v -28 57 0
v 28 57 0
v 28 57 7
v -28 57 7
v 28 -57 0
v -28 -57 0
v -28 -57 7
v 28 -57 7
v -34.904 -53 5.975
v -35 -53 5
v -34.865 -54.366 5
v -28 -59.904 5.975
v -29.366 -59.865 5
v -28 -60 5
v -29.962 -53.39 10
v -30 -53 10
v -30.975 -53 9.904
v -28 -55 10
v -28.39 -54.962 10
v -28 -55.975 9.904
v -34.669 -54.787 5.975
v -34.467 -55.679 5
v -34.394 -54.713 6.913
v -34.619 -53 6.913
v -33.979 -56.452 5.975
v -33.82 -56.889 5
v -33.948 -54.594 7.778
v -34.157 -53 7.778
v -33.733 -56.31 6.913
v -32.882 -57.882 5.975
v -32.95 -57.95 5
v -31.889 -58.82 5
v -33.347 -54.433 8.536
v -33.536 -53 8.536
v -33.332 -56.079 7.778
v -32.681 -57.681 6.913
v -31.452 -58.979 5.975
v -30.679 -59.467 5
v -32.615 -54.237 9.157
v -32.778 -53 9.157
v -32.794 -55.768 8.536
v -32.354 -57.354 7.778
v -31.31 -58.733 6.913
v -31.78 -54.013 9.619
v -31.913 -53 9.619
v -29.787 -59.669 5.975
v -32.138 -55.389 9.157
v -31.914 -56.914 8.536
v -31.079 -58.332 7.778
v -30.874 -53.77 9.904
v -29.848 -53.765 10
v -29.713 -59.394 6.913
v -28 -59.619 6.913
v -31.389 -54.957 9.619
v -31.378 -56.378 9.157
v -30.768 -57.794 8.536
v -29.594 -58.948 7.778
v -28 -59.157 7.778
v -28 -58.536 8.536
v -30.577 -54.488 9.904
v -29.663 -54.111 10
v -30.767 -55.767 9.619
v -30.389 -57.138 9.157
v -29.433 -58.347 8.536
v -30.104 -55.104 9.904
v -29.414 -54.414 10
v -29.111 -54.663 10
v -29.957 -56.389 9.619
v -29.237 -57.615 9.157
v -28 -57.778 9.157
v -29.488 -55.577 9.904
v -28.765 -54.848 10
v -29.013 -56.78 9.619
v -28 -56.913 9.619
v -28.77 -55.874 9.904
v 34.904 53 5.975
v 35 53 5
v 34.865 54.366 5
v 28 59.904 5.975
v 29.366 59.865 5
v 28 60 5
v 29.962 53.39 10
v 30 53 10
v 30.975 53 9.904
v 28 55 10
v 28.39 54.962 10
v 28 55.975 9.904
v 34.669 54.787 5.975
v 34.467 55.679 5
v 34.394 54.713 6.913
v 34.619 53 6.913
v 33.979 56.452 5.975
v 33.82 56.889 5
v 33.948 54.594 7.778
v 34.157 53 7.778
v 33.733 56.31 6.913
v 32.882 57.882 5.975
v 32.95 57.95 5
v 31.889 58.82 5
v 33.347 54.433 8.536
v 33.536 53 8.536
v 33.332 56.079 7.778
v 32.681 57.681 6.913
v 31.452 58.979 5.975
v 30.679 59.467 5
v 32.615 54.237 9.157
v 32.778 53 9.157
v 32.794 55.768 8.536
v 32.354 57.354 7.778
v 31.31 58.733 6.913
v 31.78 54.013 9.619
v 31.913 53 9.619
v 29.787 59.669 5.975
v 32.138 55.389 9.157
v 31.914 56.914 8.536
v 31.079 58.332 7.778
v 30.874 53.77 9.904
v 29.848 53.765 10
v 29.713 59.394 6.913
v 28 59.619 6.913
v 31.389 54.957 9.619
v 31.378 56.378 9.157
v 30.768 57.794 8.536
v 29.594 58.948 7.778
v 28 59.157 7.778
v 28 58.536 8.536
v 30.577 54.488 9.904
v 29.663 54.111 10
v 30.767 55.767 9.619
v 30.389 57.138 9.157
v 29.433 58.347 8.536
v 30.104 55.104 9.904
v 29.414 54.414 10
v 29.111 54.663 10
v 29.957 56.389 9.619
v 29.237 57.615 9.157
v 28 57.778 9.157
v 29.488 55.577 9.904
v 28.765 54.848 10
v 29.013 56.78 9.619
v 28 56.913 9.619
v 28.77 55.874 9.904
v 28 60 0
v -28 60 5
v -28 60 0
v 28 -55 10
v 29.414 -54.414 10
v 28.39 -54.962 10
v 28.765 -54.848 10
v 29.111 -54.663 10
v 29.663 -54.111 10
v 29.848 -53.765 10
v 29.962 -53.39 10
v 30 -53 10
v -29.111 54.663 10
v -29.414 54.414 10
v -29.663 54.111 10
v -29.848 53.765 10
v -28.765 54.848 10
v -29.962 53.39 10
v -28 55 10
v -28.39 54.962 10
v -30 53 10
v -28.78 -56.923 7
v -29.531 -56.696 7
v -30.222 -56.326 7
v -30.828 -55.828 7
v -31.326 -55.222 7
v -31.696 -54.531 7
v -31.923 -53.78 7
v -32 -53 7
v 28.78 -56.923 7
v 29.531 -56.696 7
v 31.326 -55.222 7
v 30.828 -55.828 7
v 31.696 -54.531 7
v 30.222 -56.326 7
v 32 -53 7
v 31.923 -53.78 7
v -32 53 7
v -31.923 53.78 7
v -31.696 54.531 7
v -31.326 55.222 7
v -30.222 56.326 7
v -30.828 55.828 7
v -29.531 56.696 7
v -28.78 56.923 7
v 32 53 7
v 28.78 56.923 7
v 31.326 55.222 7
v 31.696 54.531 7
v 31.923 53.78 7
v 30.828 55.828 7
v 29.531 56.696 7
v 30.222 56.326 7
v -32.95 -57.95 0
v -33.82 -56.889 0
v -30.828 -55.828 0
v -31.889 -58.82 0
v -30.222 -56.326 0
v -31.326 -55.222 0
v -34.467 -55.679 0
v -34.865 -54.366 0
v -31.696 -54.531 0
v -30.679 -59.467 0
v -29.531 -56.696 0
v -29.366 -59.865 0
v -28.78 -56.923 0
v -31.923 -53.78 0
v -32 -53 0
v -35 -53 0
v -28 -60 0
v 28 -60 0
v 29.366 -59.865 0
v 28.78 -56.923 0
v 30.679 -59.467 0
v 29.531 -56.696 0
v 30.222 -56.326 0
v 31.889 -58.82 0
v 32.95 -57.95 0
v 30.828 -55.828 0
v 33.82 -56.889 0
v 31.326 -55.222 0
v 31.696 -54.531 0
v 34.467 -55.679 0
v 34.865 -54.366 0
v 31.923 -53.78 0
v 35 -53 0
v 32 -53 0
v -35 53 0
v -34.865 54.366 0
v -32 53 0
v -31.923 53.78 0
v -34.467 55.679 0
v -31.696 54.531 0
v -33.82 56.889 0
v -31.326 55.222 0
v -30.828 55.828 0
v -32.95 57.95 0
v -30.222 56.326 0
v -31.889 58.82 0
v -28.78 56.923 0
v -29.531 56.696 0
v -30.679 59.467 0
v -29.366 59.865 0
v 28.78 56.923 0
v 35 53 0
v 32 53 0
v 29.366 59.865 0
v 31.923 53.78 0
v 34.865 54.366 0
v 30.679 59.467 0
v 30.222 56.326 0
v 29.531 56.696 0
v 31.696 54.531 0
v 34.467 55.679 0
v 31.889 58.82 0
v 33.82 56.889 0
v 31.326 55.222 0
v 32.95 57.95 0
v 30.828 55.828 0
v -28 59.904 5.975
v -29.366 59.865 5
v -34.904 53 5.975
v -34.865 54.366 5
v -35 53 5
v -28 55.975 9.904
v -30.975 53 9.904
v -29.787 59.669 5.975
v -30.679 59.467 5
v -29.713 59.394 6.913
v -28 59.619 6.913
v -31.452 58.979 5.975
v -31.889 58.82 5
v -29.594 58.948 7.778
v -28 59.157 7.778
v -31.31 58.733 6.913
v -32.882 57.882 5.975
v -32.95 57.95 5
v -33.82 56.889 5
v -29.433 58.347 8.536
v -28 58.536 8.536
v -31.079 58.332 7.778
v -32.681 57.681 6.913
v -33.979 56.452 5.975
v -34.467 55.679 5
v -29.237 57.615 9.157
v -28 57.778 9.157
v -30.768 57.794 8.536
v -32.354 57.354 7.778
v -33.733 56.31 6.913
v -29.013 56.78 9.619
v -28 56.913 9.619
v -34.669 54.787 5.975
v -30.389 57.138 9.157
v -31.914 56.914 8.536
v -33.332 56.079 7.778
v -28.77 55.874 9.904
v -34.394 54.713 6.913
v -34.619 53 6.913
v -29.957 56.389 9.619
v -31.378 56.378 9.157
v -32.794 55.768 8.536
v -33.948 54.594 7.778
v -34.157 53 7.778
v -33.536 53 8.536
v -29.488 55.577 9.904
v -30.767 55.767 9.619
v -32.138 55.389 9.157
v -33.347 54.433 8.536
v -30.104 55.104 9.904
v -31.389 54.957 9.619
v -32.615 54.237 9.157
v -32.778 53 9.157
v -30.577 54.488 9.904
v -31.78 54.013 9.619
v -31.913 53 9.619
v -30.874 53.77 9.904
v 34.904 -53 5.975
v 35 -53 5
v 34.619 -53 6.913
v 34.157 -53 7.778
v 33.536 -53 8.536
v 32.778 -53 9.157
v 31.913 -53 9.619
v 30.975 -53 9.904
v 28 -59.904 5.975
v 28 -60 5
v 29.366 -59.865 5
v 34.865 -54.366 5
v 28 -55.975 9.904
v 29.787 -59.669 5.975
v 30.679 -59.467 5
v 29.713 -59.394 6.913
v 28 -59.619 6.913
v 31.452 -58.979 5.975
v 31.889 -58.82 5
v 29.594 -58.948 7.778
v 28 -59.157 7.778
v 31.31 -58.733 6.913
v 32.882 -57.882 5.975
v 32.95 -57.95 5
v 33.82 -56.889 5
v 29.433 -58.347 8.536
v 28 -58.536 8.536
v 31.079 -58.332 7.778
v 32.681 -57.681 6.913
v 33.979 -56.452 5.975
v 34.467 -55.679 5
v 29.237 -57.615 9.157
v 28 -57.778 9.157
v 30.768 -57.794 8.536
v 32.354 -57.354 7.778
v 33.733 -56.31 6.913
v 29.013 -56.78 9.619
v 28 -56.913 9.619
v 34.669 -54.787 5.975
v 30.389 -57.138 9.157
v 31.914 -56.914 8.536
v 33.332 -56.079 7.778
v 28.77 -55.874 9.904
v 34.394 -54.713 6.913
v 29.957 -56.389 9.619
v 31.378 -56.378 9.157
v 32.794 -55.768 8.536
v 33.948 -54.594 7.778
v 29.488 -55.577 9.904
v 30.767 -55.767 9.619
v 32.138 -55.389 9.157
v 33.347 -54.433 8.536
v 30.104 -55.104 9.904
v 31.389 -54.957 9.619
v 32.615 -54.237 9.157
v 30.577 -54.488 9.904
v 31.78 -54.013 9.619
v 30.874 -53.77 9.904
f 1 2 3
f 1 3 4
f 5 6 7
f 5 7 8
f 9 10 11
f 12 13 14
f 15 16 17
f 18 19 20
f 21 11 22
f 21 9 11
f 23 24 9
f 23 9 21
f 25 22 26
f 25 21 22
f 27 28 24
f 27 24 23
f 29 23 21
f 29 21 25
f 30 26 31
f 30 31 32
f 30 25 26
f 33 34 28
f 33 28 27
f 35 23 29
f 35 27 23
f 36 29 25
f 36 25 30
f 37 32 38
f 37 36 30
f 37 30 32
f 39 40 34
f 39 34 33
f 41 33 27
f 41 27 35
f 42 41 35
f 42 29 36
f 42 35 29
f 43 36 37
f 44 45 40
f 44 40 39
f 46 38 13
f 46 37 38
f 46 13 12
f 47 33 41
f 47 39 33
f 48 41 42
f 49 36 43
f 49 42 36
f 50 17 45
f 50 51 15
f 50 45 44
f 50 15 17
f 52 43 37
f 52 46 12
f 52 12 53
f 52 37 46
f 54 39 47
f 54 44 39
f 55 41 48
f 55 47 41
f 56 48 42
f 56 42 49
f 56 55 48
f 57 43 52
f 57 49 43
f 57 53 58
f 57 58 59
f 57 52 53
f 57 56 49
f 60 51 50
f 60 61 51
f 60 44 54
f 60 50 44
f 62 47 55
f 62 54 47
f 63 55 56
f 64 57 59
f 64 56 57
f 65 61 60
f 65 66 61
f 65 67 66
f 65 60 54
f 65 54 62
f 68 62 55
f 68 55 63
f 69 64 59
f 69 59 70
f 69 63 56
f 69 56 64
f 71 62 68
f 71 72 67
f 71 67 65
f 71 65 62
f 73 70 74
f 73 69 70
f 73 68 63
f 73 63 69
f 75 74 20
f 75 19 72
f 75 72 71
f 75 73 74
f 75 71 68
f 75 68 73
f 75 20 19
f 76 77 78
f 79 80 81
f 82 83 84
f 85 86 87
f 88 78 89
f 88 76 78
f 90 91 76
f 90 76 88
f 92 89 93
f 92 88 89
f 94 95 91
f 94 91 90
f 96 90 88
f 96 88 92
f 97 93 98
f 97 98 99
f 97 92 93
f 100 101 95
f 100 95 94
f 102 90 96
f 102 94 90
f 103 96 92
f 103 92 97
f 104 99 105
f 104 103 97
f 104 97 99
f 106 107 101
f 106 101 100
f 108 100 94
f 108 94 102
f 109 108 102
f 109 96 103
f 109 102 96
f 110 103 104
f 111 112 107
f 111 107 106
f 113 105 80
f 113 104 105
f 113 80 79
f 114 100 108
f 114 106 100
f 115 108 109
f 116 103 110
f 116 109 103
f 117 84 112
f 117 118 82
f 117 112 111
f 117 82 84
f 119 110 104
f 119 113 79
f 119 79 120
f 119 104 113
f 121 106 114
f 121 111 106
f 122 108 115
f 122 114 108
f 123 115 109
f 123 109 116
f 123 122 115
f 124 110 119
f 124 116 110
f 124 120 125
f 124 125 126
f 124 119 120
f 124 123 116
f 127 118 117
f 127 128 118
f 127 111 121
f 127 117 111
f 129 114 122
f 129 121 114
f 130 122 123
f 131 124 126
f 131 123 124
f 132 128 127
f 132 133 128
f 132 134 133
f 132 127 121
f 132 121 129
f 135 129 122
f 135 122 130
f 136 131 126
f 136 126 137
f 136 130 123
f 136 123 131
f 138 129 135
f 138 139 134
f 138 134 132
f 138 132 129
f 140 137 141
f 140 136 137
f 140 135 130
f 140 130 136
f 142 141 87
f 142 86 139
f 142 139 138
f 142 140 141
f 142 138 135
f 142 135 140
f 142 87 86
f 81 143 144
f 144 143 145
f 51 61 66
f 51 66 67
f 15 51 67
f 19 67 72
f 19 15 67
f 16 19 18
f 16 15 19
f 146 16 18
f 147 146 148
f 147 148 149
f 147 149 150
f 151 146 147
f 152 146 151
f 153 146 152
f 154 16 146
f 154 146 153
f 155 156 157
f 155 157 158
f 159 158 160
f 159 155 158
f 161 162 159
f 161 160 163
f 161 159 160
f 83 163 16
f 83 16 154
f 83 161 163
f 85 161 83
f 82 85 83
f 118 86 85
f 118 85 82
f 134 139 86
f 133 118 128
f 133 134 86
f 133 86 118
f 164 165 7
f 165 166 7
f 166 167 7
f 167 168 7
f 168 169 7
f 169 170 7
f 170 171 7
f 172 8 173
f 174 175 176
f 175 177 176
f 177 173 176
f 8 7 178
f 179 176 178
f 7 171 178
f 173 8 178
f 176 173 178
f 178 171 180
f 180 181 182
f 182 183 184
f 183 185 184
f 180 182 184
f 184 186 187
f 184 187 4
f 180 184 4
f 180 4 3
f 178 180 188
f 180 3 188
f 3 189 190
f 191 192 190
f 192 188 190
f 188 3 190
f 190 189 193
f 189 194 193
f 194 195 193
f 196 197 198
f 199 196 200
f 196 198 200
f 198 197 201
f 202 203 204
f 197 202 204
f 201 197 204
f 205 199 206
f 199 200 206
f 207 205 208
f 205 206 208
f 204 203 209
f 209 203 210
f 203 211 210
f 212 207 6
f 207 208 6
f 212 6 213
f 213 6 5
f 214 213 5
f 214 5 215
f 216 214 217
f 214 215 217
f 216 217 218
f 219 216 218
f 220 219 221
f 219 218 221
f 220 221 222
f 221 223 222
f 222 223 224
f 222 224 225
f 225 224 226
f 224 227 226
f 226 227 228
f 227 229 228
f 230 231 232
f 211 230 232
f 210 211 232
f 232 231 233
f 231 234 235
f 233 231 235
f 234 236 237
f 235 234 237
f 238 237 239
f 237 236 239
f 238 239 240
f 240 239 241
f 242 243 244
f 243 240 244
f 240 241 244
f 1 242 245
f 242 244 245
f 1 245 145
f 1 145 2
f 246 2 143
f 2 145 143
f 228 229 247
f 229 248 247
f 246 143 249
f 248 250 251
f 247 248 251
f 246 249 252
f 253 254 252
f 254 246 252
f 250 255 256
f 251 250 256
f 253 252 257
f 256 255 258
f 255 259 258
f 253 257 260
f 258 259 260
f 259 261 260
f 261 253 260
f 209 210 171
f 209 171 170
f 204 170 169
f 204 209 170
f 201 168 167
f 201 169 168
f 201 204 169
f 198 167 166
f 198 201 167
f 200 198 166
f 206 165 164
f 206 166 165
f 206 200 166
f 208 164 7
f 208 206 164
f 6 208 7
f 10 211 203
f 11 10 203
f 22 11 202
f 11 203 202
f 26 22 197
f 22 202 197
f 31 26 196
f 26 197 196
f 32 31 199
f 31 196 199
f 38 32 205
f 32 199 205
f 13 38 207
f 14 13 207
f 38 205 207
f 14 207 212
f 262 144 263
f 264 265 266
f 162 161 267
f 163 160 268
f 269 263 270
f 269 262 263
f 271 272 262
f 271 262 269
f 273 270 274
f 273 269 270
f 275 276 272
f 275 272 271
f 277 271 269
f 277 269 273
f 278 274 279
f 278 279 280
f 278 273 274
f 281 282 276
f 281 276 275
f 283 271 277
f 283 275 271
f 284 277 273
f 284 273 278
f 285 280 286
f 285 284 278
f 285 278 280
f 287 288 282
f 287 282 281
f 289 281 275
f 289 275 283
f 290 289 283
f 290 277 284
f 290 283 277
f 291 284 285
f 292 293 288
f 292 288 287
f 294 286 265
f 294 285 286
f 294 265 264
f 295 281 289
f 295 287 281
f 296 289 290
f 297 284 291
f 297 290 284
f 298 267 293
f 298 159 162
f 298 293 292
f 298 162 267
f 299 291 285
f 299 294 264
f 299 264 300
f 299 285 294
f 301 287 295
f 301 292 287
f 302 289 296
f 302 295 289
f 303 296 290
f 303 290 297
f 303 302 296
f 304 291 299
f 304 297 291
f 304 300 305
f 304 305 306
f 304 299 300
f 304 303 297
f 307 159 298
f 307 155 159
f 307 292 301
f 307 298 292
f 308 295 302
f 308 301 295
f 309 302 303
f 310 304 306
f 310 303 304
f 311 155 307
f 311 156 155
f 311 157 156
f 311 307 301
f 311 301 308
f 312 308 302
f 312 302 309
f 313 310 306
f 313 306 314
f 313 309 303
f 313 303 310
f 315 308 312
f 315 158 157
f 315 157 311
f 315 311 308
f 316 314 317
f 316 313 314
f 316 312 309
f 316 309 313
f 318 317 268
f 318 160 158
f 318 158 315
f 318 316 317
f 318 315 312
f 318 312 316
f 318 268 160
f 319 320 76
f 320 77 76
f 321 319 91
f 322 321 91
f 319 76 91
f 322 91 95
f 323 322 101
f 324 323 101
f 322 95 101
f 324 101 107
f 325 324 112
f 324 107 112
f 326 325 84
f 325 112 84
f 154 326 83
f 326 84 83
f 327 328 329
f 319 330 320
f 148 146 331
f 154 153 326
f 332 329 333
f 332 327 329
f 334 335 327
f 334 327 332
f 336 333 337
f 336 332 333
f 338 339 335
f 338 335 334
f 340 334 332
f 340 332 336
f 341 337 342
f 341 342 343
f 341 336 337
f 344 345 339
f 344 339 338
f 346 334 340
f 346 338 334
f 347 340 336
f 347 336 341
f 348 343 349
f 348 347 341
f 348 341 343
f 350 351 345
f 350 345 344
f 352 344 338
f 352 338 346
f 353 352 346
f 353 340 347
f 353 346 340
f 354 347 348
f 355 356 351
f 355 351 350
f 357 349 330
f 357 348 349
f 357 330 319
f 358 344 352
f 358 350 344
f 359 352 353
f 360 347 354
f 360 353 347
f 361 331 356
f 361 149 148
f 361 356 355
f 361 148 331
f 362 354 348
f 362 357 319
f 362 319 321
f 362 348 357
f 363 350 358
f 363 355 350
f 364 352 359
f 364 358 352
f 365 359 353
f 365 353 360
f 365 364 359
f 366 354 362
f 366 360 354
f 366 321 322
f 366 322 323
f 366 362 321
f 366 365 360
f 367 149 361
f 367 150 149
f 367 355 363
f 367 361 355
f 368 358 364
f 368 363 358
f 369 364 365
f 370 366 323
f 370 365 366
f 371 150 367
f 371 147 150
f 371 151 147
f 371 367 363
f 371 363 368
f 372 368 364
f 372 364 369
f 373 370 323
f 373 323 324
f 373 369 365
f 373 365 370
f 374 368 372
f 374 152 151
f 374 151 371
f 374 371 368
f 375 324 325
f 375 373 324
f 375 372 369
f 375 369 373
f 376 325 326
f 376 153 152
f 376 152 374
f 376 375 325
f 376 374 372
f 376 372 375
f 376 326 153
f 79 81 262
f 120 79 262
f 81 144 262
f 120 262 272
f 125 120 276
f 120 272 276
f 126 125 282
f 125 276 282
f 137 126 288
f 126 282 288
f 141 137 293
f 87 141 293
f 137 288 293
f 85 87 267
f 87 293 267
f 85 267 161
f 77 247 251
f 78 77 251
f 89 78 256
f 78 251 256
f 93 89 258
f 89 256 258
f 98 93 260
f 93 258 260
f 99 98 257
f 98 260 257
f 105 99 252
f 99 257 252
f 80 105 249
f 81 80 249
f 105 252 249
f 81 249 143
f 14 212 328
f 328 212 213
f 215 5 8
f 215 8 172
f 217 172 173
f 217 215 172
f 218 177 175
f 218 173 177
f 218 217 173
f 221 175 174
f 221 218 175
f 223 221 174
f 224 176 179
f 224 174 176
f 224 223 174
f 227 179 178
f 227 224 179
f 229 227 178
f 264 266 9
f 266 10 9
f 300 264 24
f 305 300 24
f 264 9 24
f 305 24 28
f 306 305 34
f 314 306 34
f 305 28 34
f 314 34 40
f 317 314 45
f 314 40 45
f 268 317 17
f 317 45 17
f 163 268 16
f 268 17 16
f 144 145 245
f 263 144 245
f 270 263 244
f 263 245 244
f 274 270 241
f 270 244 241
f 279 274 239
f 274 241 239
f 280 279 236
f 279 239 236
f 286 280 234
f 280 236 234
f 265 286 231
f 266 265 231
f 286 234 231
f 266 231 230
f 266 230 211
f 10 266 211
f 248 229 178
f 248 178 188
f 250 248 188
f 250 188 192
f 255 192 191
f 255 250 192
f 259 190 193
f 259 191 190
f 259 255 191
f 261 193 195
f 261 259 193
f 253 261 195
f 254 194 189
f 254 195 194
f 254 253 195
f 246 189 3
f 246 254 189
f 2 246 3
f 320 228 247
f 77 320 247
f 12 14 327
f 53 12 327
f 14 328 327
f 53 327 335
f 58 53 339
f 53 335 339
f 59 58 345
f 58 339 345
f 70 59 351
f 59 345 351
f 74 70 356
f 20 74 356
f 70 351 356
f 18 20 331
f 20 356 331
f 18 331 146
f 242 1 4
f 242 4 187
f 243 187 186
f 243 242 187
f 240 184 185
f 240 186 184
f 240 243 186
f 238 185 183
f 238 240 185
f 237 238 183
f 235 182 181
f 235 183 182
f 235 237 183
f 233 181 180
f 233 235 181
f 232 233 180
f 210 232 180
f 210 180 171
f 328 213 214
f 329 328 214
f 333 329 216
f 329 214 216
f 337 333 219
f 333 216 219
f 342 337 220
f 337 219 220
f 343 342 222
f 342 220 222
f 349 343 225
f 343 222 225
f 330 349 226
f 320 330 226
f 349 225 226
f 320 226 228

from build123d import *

# Parameters (mm, degrees)
F1_DEPTH = 10
F2_T     = -3
F3_R     = 5


with BuildPart() as f1:
    # F0 (on Top) → F1 (new body)
    with BuildSketch(Plane.XY):
        with BuildLine():
            ThreePointArc((-28, 60), (-32.949747, 57.949747), (-35, 53))
            Line((-35, 53), (-35, 0))
            Line((-35, 0), (-35, -53))
            ThreePointArc((-35, -53), (-32.949747, -57.949747), (-28, -60))
            Line((-28, -60), (28, -60))
            ThreePointArc((28, -60), (32.949747, -57.949747), (35, -53))
            Line((35, -53), (35, 0))
            Line((35, 0), (35, 53))
            ThreePointArc((35, 53), (32.949747, 57.949747), (28, 60))
            Line((28, 60), (0, 60))
            Line((0, 60), (-28, 60))
        make_face()
    extrude(amount=F1_DEPTH)

    # F2
    f2_openings = [f1.faces().sort_by_distance(p)[0] for p in [
        (0, 0, 0),
    ]]
    offset(amount=F2_T, openings=f2_openings)

    # F3
    f3_edges = [f1.edges().sort_by_distance(p)[0] for p in [
        (-32.949747, 57.949747, 10),
    ]]
    fillet(f3_edges, radius=F3_R)


solid = f1.part
